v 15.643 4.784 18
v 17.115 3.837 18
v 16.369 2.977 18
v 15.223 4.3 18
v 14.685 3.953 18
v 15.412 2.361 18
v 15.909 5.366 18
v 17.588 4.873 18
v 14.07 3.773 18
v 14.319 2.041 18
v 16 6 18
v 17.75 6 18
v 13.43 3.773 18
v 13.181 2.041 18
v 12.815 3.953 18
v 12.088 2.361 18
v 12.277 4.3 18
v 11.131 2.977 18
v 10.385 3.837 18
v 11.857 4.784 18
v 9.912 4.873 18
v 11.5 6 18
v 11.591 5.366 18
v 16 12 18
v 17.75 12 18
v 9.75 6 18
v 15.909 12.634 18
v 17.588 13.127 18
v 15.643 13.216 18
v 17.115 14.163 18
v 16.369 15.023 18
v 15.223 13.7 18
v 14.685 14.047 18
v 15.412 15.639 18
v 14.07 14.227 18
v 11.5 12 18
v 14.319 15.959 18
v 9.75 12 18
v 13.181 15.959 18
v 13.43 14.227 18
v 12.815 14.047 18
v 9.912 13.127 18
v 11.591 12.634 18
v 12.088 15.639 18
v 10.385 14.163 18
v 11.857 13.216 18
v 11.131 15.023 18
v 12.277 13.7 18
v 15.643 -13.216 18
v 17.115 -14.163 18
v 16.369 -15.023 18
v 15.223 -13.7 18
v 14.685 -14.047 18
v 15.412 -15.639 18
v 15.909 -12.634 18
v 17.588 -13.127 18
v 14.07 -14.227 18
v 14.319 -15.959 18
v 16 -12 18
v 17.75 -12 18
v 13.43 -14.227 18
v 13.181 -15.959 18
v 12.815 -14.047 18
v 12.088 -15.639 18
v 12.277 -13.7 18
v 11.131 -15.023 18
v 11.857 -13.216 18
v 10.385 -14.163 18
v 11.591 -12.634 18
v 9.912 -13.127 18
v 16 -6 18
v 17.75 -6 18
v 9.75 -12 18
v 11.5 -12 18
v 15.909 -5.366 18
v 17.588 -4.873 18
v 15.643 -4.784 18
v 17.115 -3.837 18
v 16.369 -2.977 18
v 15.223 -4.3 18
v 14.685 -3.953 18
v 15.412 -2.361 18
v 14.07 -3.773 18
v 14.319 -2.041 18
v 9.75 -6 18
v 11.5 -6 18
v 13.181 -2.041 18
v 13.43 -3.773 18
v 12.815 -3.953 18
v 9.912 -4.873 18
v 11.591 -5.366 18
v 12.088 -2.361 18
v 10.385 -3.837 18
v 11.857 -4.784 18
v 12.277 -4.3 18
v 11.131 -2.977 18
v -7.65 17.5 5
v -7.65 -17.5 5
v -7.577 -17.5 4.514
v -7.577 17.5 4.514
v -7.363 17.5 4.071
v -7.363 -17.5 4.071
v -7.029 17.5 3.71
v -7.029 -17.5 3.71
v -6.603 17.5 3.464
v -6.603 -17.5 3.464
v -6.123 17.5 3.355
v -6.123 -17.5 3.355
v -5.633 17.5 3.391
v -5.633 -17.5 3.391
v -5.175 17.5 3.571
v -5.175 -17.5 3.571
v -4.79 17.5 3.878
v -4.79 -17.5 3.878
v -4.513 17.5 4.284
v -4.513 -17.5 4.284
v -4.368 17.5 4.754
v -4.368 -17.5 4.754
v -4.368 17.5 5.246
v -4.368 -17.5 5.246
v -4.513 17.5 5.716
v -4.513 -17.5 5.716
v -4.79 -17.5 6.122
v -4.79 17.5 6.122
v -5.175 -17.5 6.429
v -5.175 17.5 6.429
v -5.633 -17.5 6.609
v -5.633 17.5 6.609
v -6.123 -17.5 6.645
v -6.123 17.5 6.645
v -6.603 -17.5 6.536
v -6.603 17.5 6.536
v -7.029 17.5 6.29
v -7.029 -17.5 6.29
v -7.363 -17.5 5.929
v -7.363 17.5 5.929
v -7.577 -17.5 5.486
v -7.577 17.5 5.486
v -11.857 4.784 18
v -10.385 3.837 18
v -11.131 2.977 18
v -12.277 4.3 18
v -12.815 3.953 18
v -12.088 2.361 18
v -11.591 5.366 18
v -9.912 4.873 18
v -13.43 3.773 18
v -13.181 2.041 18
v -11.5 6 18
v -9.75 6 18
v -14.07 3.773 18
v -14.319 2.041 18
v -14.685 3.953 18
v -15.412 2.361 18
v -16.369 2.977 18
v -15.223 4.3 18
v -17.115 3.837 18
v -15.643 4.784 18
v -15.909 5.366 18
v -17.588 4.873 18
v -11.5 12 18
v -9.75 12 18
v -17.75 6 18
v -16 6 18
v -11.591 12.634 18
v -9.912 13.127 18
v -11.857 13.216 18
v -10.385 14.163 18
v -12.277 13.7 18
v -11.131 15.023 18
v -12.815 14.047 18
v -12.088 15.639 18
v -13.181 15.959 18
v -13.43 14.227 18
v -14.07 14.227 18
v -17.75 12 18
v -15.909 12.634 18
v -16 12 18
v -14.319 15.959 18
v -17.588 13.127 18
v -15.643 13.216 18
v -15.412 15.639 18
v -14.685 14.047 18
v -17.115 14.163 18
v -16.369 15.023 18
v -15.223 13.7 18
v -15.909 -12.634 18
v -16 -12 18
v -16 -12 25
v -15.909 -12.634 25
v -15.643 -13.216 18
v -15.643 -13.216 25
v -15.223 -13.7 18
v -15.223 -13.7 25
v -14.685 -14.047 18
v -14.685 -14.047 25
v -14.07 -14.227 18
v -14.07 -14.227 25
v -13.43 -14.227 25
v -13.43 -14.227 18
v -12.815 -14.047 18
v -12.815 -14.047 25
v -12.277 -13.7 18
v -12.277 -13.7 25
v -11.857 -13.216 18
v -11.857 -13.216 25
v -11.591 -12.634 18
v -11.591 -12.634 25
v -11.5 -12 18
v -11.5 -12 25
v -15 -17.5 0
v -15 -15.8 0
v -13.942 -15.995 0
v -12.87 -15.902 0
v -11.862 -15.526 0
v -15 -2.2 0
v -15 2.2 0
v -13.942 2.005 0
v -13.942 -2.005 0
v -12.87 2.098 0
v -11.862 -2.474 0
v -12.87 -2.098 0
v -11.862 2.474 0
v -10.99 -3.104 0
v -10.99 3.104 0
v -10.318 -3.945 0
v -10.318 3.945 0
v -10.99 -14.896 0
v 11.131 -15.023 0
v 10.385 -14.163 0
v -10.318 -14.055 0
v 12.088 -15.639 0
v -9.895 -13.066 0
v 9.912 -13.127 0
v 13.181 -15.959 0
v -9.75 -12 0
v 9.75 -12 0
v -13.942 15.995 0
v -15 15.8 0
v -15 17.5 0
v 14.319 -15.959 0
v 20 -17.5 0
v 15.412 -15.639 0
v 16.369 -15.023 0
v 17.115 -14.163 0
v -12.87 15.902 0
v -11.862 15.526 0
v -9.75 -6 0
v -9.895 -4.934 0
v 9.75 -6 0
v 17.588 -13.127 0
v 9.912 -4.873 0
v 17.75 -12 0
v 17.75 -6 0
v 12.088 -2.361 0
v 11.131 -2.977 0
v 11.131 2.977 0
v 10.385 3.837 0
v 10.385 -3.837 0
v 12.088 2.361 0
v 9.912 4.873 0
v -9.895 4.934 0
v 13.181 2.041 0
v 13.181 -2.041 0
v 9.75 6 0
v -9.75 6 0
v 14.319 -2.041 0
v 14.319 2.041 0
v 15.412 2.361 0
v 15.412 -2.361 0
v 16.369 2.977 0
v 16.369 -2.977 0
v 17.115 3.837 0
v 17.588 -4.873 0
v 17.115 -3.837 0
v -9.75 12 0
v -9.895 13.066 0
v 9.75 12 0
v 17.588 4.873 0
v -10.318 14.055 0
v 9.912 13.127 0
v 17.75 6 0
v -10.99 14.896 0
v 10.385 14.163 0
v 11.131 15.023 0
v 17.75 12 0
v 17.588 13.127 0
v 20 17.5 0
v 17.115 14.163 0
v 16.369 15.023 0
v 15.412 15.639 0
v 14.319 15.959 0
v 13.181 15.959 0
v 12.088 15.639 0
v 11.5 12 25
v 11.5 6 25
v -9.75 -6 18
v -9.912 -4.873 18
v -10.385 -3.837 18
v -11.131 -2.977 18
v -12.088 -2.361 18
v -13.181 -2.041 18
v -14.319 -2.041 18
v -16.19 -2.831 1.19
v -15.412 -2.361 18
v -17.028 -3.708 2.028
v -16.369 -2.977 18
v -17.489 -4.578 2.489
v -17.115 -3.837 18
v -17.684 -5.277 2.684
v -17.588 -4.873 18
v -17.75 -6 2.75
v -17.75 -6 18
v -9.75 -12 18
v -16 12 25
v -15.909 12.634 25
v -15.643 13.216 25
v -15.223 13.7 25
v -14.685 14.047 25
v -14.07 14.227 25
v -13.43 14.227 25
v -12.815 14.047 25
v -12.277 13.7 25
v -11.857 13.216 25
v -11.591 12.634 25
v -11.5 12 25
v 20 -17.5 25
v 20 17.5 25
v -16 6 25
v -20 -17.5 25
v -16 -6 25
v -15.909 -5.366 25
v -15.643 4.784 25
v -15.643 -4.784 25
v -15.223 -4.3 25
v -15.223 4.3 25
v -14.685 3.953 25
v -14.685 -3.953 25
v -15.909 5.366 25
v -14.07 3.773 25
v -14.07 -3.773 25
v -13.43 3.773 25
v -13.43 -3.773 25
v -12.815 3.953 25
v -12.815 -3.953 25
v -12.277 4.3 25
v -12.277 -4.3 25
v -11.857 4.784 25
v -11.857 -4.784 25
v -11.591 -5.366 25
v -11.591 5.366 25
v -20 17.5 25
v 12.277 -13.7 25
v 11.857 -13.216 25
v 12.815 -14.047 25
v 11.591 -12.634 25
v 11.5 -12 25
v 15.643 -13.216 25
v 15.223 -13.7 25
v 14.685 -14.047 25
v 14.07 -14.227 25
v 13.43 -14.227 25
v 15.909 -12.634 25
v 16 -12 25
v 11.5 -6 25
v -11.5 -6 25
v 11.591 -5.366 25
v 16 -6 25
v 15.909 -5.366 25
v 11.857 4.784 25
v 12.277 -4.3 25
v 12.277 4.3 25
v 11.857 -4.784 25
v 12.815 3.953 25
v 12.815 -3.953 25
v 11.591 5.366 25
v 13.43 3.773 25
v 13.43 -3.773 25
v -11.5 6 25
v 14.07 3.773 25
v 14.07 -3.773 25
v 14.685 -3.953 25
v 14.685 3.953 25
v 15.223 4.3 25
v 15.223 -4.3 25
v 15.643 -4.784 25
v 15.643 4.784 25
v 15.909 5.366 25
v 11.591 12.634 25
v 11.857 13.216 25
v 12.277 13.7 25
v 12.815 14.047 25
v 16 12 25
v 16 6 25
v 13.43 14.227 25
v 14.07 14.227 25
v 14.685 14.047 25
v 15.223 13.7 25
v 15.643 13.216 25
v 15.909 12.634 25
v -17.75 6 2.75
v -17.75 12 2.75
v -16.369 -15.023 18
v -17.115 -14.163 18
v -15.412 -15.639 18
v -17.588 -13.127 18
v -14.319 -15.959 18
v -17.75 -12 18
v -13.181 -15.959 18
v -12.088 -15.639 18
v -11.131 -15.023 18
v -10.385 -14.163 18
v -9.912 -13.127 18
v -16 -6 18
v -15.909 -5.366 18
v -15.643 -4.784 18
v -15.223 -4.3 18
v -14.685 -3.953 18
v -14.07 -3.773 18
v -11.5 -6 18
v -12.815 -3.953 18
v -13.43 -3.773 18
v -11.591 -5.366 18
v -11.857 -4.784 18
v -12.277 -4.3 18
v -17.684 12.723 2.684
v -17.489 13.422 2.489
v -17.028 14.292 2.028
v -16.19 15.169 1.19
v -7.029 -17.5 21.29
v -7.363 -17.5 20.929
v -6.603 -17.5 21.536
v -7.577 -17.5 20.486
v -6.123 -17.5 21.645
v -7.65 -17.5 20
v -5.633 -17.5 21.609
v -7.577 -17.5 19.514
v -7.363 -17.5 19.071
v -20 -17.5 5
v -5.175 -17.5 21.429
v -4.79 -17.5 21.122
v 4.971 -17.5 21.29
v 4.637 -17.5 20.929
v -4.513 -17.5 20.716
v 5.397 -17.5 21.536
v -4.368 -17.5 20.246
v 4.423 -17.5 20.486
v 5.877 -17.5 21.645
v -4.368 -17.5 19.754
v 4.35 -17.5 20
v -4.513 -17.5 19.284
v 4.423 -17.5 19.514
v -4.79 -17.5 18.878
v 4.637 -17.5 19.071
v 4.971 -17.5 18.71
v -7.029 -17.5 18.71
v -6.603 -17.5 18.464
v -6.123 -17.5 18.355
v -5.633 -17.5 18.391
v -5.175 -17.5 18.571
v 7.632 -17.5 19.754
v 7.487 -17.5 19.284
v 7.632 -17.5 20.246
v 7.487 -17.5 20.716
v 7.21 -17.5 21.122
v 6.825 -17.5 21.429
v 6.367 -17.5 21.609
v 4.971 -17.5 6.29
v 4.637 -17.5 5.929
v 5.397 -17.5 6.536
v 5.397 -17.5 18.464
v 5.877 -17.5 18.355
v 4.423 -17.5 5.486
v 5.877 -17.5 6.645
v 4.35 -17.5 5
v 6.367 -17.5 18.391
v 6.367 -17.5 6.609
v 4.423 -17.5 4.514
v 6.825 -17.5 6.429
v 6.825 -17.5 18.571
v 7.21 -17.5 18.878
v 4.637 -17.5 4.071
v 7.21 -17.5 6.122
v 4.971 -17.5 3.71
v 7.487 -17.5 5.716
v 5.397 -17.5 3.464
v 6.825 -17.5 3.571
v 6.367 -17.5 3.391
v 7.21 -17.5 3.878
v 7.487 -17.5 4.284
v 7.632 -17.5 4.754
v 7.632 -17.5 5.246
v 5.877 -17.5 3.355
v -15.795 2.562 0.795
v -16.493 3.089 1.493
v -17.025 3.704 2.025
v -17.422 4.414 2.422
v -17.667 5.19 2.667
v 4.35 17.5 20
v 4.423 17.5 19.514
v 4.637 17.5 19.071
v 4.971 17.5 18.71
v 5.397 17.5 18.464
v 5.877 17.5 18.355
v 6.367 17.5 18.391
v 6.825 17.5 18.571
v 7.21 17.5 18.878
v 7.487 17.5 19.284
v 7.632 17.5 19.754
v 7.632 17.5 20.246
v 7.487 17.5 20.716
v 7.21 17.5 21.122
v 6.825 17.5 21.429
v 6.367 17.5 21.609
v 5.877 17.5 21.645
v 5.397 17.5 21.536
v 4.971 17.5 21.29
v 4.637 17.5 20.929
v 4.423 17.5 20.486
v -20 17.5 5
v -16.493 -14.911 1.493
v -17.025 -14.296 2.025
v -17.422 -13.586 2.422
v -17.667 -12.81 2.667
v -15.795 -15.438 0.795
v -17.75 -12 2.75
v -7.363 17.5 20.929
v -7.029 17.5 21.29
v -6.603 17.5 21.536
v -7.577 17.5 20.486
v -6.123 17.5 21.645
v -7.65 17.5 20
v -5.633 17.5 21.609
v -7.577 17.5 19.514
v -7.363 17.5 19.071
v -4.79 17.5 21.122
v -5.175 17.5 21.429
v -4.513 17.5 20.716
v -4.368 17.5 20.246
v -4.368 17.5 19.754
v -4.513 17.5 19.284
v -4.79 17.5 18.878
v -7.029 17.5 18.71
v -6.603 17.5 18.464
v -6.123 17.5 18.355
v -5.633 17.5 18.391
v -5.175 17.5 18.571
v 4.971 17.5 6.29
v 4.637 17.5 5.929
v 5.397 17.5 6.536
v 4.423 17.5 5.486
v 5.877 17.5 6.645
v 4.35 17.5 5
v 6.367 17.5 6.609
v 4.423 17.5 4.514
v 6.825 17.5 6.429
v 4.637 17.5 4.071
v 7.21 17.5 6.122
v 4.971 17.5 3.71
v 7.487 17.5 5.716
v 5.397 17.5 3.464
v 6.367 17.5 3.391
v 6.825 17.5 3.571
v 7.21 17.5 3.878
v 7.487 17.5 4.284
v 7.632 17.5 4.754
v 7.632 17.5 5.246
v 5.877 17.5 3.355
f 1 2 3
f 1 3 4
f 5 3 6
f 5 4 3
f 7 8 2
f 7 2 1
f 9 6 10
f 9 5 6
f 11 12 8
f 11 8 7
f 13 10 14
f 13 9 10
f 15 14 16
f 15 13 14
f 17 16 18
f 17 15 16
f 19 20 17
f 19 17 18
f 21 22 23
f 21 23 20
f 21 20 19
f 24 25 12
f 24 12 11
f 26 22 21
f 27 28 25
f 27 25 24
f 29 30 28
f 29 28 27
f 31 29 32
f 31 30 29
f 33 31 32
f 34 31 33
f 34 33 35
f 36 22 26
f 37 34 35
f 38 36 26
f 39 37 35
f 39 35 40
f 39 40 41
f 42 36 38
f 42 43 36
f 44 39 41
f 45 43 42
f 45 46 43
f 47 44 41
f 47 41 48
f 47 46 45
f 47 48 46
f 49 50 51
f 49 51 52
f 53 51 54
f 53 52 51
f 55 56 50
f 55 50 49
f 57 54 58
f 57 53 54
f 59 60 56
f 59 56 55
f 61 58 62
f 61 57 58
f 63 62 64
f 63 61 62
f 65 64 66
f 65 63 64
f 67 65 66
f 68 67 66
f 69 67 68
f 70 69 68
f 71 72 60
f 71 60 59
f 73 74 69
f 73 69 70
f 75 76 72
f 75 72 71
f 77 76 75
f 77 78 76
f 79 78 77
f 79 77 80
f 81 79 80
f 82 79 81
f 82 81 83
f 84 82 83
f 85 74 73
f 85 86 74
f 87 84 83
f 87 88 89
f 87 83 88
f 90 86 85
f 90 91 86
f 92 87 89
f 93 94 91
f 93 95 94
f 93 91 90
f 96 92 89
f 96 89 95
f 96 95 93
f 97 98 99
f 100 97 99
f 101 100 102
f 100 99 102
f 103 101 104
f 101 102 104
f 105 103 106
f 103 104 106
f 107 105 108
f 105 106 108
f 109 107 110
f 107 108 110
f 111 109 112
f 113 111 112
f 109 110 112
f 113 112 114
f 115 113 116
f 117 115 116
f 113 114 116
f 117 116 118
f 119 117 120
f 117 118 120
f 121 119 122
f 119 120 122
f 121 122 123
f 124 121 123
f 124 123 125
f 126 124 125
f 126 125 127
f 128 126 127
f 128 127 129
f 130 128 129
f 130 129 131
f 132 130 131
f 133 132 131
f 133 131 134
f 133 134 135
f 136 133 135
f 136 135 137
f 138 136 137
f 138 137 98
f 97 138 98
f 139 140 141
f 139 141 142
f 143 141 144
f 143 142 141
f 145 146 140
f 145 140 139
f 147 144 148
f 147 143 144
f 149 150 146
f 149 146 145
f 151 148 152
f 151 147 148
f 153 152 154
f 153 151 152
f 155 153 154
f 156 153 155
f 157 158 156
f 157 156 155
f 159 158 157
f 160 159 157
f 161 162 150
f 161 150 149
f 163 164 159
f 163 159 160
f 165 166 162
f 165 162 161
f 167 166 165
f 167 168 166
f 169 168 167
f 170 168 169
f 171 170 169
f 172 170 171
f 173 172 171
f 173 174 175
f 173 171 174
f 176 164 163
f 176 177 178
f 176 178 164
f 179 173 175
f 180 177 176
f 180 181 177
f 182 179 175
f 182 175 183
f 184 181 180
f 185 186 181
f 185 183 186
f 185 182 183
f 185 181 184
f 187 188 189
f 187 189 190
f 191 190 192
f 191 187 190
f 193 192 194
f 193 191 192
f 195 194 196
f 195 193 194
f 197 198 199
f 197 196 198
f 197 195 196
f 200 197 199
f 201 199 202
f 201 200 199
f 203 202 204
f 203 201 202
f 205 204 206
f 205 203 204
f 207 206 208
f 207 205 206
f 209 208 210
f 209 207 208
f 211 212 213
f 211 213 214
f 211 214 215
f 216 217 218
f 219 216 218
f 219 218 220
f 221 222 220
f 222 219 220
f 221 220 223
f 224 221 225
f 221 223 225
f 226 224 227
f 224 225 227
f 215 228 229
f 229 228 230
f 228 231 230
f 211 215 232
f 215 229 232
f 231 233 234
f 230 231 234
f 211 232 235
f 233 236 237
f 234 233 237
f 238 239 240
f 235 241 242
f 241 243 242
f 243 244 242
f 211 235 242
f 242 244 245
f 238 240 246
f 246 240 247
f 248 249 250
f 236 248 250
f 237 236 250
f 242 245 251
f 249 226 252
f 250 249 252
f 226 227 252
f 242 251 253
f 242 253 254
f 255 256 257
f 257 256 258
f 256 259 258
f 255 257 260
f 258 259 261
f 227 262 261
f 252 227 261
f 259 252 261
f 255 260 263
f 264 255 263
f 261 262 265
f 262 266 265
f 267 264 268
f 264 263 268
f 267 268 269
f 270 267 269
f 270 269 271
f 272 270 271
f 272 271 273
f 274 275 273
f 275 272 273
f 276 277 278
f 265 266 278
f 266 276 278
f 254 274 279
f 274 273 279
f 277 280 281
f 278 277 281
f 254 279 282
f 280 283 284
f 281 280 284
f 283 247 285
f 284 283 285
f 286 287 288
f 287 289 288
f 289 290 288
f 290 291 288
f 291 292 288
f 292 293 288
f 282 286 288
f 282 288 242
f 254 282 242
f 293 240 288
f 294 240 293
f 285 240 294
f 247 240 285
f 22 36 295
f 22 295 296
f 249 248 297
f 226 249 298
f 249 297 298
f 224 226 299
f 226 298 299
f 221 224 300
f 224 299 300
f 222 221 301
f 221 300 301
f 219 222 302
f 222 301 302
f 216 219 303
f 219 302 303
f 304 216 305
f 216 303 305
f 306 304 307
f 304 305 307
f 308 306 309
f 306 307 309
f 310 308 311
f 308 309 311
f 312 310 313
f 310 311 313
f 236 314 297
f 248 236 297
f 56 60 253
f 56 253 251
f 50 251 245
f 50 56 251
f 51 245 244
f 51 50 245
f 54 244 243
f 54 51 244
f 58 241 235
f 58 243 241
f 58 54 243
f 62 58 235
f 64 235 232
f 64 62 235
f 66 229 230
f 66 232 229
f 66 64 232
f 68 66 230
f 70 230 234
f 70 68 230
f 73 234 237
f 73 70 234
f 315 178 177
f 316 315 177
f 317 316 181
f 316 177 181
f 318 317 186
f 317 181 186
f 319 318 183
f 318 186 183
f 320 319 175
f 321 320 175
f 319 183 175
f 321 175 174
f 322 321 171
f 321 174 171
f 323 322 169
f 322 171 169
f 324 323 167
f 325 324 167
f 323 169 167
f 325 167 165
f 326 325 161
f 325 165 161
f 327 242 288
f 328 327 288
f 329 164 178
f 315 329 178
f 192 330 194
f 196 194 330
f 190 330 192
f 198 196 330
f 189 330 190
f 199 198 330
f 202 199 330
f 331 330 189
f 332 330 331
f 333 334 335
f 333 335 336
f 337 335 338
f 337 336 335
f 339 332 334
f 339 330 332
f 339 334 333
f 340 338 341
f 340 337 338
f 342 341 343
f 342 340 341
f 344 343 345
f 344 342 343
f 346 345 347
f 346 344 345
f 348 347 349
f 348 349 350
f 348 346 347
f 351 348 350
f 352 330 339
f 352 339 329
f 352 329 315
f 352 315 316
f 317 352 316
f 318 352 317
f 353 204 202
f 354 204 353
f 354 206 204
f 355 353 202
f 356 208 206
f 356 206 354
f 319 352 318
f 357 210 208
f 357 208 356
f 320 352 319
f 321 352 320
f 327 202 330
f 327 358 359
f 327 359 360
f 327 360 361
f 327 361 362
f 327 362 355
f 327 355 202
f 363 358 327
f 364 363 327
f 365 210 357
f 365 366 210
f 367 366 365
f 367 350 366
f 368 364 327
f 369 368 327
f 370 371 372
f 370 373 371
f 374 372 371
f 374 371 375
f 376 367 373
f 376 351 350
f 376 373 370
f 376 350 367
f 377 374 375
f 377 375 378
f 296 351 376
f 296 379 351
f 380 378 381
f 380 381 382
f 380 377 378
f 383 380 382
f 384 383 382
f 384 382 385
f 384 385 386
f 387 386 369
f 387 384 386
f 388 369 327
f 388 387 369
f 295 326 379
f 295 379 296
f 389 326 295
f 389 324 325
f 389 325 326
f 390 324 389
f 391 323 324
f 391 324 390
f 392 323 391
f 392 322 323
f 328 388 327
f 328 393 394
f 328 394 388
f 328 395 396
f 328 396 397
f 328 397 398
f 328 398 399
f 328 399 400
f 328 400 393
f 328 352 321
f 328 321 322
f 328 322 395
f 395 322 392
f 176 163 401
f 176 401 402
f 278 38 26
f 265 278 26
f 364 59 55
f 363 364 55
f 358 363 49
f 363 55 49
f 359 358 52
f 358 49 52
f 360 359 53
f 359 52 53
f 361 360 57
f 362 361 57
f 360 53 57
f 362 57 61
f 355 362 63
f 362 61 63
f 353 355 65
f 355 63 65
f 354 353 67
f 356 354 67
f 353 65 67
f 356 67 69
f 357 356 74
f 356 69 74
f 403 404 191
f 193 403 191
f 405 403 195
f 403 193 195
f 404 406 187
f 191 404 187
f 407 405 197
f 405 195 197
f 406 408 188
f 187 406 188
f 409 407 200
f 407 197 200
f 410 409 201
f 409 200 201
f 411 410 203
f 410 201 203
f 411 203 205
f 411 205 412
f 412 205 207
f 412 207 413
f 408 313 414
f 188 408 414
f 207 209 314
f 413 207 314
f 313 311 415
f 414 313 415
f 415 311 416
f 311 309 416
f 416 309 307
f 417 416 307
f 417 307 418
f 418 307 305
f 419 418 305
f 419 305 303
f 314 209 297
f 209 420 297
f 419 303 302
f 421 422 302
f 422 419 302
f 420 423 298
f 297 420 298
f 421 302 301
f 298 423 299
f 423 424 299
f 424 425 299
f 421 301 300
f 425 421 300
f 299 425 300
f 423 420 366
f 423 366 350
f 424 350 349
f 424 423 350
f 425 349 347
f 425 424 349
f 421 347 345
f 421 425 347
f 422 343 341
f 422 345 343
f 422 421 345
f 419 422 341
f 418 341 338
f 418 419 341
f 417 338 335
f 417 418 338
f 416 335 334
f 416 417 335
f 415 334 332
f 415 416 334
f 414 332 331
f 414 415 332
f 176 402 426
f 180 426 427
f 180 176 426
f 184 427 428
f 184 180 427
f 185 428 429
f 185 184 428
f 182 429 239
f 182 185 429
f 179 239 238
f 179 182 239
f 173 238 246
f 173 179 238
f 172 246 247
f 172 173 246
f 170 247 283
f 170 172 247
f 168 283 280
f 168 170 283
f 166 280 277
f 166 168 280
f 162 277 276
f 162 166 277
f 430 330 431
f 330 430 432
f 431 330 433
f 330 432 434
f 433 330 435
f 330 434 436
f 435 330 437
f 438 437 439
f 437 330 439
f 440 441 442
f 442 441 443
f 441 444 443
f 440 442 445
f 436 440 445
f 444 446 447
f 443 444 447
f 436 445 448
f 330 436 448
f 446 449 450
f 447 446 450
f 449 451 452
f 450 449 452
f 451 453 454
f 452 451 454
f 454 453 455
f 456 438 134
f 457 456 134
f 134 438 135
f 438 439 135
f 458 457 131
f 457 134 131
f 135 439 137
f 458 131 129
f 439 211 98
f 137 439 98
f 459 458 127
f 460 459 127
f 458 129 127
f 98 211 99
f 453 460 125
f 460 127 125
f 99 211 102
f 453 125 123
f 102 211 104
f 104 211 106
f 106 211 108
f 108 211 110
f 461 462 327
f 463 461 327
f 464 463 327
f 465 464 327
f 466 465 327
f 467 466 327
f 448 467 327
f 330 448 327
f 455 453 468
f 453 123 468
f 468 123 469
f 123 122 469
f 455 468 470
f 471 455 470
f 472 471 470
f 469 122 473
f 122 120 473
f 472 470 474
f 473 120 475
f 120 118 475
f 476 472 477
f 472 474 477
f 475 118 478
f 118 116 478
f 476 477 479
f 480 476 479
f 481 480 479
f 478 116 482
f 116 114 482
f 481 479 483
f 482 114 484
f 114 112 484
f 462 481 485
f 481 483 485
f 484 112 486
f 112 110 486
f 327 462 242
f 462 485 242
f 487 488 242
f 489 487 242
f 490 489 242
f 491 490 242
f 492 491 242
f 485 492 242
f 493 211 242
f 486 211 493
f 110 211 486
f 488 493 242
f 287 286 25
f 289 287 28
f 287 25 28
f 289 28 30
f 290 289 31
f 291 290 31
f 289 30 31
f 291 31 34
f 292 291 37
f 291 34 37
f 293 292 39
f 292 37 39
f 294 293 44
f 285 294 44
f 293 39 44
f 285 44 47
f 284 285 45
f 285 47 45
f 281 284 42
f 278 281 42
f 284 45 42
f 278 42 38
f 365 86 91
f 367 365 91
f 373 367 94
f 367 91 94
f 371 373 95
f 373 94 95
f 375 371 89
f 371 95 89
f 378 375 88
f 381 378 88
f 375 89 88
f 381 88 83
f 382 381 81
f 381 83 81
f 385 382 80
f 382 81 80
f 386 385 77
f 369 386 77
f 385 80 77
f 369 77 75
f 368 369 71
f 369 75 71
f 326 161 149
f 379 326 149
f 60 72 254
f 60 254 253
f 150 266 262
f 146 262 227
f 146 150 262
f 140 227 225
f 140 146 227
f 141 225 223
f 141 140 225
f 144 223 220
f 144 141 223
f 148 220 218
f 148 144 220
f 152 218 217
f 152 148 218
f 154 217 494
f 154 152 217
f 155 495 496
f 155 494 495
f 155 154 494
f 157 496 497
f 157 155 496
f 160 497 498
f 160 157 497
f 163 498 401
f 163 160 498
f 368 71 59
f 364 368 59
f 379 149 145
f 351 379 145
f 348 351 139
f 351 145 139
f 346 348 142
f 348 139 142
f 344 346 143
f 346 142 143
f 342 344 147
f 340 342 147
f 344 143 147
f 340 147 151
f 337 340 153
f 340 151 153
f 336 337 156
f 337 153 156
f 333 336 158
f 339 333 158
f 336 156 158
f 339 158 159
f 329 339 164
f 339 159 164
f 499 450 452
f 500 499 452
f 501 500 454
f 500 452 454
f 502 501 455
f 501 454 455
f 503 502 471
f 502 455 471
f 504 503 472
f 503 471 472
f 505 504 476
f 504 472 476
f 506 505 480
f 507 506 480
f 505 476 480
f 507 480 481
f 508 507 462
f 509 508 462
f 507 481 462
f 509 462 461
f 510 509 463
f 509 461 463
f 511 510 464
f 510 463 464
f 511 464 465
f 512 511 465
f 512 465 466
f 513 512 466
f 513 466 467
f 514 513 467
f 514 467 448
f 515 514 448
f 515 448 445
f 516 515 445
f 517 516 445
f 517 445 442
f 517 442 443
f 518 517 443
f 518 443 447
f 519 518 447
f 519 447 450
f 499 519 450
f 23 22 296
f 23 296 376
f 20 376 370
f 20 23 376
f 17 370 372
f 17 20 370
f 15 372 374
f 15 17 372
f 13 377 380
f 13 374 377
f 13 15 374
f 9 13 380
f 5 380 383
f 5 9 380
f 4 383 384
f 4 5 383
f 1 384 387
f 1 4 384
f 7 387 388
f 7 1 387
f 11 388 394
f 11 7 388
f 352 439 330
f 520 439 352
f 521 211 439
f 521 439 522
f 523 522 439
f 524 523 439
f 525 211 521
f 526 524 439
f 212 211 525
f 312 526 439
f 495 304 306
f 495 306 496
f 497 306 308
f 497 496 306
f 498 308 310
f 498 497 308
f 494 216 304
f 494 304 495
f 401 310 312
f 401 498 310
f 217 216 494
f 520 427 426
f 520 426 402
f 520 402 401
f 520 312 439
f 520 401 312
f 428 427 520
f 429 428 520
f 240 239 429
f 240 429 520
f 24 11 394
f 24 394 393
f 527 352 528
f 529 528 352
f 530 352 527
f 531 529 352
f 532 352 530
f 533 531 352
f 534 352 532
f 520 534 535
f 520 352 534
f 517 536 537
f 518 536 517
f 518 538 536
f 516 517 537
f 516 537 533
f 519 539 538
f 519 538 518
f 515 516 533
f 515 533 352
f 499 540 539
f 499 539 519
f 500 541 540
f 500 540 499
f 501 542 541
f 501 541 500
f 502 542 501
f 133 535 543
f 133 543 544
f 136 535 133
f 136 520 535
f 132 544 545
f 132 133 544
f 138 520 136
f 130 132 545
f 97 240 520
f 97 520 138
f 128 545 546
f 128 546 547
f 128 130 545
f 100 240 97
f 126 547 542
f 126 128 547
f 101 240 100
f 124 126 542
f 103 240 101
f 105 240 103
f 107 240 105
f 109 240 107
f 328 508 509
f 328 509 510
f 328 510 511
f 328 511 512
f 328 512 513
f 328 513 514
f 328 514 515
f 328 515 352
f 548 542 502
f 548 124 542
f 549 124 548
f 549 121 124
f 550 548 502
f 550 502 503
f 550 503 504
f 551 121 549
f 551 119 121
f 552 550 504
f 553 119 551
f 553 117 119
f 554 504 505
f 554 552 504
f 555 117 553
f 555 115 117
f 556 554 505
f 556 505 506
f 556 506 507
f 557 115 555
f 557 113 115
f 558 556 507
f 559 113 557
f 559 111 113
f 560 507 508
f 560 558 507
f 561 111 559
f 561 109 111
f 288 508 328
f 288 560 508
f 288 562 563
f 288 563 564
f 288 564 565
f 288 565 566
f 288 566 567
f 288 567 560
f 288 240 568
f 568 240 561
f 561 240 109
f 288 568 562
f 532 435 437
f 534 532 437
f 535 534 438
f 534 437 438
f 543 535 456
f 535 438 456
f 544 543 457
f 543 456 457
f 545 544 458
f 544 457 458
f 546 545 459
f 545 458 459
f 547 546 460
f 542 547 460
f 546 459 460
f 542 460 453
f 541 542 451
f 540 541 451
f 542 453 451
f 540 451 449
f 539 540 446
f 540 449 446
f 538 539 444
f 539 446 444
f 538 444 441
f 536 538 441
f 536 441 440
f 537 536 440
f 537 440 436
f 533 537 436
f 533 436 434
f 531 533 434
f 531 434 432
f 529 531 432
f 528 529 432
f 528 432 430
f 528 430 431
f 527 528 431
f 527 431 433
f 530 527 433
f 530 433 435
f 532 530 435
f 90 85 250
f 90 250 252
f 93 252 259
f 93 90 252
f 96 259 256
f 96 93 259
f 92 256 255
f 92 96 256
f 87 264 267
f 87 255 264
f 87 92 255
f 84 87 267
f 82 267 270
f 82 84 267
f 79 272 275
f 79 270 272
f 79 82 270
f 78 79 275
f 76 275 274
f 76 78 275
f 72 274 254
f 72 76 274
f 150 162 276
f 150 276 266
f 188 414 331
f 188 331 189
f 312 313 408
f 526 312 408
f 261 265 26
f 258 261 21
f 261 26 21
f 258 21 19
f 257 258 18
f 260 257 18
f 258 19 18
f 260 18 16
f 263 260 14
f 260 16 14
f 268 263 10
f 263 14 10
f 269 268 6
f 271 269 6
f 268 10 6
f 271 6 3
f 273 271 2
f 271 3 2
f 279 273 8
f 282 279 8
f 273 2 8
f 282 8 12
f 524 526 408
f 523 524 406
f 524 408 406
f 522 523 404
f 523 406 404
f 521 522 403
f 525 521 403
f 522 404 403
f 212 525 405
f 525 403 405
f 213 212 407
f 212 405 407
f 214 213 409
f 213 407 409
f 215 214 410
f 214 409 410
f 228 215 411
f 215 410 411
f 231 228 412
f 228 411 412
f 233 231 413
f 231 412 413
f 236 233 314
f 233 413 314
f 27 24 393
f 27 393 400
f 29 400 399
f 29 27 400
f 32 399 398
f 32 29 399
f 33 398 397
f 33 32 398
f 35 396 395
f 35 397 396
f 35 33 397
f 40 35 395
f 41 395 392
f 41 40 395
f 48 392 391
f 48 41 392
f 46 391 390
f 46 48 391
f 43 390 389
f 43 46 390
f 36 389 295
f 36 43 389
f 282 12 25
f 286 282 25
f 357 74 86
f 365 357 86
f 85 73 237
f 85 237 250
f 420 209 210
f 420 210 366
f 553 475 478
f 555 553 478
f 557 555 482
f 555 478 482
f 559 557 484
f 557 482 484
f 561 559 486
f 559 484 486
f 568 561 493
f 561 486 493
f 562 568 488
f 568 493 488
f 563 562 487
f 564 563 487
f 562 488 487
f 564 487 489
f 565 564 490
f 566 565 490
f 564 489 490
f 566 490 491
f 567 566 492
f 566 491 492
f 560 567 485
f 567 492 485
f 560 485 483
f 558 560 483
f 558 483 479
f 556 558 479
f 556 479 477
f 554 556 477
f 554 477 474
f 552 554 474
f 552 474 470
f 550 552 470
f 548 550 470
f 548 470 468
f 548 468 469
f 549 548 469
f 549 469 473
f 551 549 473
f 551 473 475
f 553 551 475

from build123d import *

# Parameters (mm, degrees)
SKETCH1_W                                            = 40
SKETCH1_H                                            = 35
BOSS_EXTRUDE1_DEPTH                                  = 25
CHAMFER1_SIZE                                        = 5
CBORE_FOR_M4_HEXAGON_SOCKET_HEAD_CAP_SCR_D           = 4.5
CBORE_FOR_M4_HEXAGON_SOCKET_HEAD_CAP_SCR_CBORE_D     = 8
CBORE_FOR_M4_HEXAGON_SOCKET_HEAD_CAP_SCR_CBORE_DEPTH = 18
CUT_EXTRUDE1_DEPTH                                   = 33.097507691
CUT_EXTRUDE2_DEPTH                                   = 33.097507691
M4_TAPPED_HOLE1_D                                    = 3.3


with BuildPart() as part:
    # Sketch1 → Boss-Extrude1 (new body)
    with BuildSketch(Plane.XY):
        Rectangle(SKETCH1_W, SKETCH1_H)
    extrude(amount=BOSS_EXTRUDE1_DEPTH)

    # Chamfer1
    chamfer1_edges = [part.edges().sort_by_distance(p)[0] for p in [
        (-20, 0, 0),
    ]]
    chamfer(chamfer1_edges, length=CHAMFER1_SIZE)

    # CBORE for M4 Hexagon socket head cap screws1 (through all)
    with Locations(Plane(origin=(0, 0, 0), x_dir=(-1, 0, 0), z_dir=(0, 0, -1))):
        with Locations((-13.75, 9), (-13.75, -9), (13.75, -9), (13.75, 9)):
            CounterBoreHole(CBORE_FOR_M4_HEXAGON_SOCKET_HEAD_CAP_SCR_D / 2, CBORE_FOR_M4_HEXAGON_SOCKET_HEAD_CAP_SCR_CBORE_D / 2, CBORE_FOR_M4_HEXAGON_SOCKET_HEAD_CAP_SCR_CBORE_DEPTH)

    # Sketch5 → Cut-Extrude1 (cut, through all)
    with BuildSketch(Plane(origin=(0, 0, 18), x_dir=(-1, 0, 0), z_dir=(0, 0, -1))):
        with BuildLine():
            Line((-9.75, 12), (-9.75, 6))
            ThreePointArc((-9.75, 6), (-13.75, 2), (-17.75, 6))
            Line((-17.75, 6), (-17.75, 12))
            ThreePointArc((-17.75, 12), (-13.75, 16), (-9.75, 12))
        make_face()
        with BuildLine():
            Line((-9.75, -12), (-9.75, -6))
            ThreePointArc((-9.75, -6), (-13.75, -2), (-17.75, -6))
            Line((-17.75, -6), (-17.75, -12))
            ThreePointArc((-17.75, -12), (-13.75, -16), (-9.75, -12))
        make_face()
        with BuildLine():
            Line((9.75, 12), (9.75, 6))
            ThreePointArc((9.75, 6), (13.75, 2), (17.75, 6))
            Line((17.75, 6), (17.75, 12))
            ThreePointArc((17.75, 12), (13.75, 16), (9.75, 12))
        make_face()
        with BuildLine():
            Line((9.75, -12), (9.75, -6))
            ThreePointArc((9.75, -6), (13.75, -2), (17.75, -6))
            Line((17.75, -6), (17.75, -12))
            ThreePointArc((17.75, -12), (13.75, -16), (9.75, -12))
        make_face()
    extrude(amount=CUT_EXTRUDE1_DEPTH, mode=Mode.SUBTRACT)

    # Sketch6 → Cut-Extrude2 (cut, through all)
    with BuildSketch(Plane(origin=(0, 0, 18), x_dir=(-1, 0, 0), z_dir=(0, 0, -1))):
        with BuildLine():
            Line((-11.5, 12), (-11.5, 6))
            ThreePointArc((-11.5, 6), (-13.75, 3.75), (-16, 6))
            Line((-16, 6), (-16, 12))
            ThreePointArc((-16, 12), (-13.75, 14.25), (-11.5, 12))
        make_face()
        with BuildLine():
            Line((11.5, 12), (11.5, 6))
            ThreePointArc((11.5, 6), (13.75, 3.75), (16, 6))
            Line((16, 6), (16, 12))
            ThreePointArc((16, 12), (13.75, 14.25), (11.5, 12))
        make_face()
        with BuildLine():
            Line((-11.5, -12), (-11.5, -6))
            ThreePointArc((-11.5, -6), (-13.75, -3.75), (-16, -6))
            Line((-16, -6), (-16, -12))
            ThreePointArc((-16, -12), (-13.75, -14.25), (-11.5, -12))
        make_face()
        with BuildLine():
            Line((11.5, -12), (11.5, -6))
            ThreePointArc((11.5, -6), (13.75, -3.75), (16, -6))
            Line((16, -6), (16, -12))
            ThreePointArc((16, -12), (13.75, -14.25), (11.5, -12))
        make_face()
    extrude(amount=-CUT_EXTRUDE2_DEPTH, mode=Mode.SUBTRACT)

    # M4 Tapped Hole1 (through all)
    with Locations(Plane(origin=(0, 17.5, 0), x_dir=(1, 0, 0), z_dir=(0, 1, 0))):
        with Locations((-6, -5), (-6, -20), (6, -20), (6, -5)):
            Hole(M4_TAPPED_HOLE1_D / 2)


solid = part.part
